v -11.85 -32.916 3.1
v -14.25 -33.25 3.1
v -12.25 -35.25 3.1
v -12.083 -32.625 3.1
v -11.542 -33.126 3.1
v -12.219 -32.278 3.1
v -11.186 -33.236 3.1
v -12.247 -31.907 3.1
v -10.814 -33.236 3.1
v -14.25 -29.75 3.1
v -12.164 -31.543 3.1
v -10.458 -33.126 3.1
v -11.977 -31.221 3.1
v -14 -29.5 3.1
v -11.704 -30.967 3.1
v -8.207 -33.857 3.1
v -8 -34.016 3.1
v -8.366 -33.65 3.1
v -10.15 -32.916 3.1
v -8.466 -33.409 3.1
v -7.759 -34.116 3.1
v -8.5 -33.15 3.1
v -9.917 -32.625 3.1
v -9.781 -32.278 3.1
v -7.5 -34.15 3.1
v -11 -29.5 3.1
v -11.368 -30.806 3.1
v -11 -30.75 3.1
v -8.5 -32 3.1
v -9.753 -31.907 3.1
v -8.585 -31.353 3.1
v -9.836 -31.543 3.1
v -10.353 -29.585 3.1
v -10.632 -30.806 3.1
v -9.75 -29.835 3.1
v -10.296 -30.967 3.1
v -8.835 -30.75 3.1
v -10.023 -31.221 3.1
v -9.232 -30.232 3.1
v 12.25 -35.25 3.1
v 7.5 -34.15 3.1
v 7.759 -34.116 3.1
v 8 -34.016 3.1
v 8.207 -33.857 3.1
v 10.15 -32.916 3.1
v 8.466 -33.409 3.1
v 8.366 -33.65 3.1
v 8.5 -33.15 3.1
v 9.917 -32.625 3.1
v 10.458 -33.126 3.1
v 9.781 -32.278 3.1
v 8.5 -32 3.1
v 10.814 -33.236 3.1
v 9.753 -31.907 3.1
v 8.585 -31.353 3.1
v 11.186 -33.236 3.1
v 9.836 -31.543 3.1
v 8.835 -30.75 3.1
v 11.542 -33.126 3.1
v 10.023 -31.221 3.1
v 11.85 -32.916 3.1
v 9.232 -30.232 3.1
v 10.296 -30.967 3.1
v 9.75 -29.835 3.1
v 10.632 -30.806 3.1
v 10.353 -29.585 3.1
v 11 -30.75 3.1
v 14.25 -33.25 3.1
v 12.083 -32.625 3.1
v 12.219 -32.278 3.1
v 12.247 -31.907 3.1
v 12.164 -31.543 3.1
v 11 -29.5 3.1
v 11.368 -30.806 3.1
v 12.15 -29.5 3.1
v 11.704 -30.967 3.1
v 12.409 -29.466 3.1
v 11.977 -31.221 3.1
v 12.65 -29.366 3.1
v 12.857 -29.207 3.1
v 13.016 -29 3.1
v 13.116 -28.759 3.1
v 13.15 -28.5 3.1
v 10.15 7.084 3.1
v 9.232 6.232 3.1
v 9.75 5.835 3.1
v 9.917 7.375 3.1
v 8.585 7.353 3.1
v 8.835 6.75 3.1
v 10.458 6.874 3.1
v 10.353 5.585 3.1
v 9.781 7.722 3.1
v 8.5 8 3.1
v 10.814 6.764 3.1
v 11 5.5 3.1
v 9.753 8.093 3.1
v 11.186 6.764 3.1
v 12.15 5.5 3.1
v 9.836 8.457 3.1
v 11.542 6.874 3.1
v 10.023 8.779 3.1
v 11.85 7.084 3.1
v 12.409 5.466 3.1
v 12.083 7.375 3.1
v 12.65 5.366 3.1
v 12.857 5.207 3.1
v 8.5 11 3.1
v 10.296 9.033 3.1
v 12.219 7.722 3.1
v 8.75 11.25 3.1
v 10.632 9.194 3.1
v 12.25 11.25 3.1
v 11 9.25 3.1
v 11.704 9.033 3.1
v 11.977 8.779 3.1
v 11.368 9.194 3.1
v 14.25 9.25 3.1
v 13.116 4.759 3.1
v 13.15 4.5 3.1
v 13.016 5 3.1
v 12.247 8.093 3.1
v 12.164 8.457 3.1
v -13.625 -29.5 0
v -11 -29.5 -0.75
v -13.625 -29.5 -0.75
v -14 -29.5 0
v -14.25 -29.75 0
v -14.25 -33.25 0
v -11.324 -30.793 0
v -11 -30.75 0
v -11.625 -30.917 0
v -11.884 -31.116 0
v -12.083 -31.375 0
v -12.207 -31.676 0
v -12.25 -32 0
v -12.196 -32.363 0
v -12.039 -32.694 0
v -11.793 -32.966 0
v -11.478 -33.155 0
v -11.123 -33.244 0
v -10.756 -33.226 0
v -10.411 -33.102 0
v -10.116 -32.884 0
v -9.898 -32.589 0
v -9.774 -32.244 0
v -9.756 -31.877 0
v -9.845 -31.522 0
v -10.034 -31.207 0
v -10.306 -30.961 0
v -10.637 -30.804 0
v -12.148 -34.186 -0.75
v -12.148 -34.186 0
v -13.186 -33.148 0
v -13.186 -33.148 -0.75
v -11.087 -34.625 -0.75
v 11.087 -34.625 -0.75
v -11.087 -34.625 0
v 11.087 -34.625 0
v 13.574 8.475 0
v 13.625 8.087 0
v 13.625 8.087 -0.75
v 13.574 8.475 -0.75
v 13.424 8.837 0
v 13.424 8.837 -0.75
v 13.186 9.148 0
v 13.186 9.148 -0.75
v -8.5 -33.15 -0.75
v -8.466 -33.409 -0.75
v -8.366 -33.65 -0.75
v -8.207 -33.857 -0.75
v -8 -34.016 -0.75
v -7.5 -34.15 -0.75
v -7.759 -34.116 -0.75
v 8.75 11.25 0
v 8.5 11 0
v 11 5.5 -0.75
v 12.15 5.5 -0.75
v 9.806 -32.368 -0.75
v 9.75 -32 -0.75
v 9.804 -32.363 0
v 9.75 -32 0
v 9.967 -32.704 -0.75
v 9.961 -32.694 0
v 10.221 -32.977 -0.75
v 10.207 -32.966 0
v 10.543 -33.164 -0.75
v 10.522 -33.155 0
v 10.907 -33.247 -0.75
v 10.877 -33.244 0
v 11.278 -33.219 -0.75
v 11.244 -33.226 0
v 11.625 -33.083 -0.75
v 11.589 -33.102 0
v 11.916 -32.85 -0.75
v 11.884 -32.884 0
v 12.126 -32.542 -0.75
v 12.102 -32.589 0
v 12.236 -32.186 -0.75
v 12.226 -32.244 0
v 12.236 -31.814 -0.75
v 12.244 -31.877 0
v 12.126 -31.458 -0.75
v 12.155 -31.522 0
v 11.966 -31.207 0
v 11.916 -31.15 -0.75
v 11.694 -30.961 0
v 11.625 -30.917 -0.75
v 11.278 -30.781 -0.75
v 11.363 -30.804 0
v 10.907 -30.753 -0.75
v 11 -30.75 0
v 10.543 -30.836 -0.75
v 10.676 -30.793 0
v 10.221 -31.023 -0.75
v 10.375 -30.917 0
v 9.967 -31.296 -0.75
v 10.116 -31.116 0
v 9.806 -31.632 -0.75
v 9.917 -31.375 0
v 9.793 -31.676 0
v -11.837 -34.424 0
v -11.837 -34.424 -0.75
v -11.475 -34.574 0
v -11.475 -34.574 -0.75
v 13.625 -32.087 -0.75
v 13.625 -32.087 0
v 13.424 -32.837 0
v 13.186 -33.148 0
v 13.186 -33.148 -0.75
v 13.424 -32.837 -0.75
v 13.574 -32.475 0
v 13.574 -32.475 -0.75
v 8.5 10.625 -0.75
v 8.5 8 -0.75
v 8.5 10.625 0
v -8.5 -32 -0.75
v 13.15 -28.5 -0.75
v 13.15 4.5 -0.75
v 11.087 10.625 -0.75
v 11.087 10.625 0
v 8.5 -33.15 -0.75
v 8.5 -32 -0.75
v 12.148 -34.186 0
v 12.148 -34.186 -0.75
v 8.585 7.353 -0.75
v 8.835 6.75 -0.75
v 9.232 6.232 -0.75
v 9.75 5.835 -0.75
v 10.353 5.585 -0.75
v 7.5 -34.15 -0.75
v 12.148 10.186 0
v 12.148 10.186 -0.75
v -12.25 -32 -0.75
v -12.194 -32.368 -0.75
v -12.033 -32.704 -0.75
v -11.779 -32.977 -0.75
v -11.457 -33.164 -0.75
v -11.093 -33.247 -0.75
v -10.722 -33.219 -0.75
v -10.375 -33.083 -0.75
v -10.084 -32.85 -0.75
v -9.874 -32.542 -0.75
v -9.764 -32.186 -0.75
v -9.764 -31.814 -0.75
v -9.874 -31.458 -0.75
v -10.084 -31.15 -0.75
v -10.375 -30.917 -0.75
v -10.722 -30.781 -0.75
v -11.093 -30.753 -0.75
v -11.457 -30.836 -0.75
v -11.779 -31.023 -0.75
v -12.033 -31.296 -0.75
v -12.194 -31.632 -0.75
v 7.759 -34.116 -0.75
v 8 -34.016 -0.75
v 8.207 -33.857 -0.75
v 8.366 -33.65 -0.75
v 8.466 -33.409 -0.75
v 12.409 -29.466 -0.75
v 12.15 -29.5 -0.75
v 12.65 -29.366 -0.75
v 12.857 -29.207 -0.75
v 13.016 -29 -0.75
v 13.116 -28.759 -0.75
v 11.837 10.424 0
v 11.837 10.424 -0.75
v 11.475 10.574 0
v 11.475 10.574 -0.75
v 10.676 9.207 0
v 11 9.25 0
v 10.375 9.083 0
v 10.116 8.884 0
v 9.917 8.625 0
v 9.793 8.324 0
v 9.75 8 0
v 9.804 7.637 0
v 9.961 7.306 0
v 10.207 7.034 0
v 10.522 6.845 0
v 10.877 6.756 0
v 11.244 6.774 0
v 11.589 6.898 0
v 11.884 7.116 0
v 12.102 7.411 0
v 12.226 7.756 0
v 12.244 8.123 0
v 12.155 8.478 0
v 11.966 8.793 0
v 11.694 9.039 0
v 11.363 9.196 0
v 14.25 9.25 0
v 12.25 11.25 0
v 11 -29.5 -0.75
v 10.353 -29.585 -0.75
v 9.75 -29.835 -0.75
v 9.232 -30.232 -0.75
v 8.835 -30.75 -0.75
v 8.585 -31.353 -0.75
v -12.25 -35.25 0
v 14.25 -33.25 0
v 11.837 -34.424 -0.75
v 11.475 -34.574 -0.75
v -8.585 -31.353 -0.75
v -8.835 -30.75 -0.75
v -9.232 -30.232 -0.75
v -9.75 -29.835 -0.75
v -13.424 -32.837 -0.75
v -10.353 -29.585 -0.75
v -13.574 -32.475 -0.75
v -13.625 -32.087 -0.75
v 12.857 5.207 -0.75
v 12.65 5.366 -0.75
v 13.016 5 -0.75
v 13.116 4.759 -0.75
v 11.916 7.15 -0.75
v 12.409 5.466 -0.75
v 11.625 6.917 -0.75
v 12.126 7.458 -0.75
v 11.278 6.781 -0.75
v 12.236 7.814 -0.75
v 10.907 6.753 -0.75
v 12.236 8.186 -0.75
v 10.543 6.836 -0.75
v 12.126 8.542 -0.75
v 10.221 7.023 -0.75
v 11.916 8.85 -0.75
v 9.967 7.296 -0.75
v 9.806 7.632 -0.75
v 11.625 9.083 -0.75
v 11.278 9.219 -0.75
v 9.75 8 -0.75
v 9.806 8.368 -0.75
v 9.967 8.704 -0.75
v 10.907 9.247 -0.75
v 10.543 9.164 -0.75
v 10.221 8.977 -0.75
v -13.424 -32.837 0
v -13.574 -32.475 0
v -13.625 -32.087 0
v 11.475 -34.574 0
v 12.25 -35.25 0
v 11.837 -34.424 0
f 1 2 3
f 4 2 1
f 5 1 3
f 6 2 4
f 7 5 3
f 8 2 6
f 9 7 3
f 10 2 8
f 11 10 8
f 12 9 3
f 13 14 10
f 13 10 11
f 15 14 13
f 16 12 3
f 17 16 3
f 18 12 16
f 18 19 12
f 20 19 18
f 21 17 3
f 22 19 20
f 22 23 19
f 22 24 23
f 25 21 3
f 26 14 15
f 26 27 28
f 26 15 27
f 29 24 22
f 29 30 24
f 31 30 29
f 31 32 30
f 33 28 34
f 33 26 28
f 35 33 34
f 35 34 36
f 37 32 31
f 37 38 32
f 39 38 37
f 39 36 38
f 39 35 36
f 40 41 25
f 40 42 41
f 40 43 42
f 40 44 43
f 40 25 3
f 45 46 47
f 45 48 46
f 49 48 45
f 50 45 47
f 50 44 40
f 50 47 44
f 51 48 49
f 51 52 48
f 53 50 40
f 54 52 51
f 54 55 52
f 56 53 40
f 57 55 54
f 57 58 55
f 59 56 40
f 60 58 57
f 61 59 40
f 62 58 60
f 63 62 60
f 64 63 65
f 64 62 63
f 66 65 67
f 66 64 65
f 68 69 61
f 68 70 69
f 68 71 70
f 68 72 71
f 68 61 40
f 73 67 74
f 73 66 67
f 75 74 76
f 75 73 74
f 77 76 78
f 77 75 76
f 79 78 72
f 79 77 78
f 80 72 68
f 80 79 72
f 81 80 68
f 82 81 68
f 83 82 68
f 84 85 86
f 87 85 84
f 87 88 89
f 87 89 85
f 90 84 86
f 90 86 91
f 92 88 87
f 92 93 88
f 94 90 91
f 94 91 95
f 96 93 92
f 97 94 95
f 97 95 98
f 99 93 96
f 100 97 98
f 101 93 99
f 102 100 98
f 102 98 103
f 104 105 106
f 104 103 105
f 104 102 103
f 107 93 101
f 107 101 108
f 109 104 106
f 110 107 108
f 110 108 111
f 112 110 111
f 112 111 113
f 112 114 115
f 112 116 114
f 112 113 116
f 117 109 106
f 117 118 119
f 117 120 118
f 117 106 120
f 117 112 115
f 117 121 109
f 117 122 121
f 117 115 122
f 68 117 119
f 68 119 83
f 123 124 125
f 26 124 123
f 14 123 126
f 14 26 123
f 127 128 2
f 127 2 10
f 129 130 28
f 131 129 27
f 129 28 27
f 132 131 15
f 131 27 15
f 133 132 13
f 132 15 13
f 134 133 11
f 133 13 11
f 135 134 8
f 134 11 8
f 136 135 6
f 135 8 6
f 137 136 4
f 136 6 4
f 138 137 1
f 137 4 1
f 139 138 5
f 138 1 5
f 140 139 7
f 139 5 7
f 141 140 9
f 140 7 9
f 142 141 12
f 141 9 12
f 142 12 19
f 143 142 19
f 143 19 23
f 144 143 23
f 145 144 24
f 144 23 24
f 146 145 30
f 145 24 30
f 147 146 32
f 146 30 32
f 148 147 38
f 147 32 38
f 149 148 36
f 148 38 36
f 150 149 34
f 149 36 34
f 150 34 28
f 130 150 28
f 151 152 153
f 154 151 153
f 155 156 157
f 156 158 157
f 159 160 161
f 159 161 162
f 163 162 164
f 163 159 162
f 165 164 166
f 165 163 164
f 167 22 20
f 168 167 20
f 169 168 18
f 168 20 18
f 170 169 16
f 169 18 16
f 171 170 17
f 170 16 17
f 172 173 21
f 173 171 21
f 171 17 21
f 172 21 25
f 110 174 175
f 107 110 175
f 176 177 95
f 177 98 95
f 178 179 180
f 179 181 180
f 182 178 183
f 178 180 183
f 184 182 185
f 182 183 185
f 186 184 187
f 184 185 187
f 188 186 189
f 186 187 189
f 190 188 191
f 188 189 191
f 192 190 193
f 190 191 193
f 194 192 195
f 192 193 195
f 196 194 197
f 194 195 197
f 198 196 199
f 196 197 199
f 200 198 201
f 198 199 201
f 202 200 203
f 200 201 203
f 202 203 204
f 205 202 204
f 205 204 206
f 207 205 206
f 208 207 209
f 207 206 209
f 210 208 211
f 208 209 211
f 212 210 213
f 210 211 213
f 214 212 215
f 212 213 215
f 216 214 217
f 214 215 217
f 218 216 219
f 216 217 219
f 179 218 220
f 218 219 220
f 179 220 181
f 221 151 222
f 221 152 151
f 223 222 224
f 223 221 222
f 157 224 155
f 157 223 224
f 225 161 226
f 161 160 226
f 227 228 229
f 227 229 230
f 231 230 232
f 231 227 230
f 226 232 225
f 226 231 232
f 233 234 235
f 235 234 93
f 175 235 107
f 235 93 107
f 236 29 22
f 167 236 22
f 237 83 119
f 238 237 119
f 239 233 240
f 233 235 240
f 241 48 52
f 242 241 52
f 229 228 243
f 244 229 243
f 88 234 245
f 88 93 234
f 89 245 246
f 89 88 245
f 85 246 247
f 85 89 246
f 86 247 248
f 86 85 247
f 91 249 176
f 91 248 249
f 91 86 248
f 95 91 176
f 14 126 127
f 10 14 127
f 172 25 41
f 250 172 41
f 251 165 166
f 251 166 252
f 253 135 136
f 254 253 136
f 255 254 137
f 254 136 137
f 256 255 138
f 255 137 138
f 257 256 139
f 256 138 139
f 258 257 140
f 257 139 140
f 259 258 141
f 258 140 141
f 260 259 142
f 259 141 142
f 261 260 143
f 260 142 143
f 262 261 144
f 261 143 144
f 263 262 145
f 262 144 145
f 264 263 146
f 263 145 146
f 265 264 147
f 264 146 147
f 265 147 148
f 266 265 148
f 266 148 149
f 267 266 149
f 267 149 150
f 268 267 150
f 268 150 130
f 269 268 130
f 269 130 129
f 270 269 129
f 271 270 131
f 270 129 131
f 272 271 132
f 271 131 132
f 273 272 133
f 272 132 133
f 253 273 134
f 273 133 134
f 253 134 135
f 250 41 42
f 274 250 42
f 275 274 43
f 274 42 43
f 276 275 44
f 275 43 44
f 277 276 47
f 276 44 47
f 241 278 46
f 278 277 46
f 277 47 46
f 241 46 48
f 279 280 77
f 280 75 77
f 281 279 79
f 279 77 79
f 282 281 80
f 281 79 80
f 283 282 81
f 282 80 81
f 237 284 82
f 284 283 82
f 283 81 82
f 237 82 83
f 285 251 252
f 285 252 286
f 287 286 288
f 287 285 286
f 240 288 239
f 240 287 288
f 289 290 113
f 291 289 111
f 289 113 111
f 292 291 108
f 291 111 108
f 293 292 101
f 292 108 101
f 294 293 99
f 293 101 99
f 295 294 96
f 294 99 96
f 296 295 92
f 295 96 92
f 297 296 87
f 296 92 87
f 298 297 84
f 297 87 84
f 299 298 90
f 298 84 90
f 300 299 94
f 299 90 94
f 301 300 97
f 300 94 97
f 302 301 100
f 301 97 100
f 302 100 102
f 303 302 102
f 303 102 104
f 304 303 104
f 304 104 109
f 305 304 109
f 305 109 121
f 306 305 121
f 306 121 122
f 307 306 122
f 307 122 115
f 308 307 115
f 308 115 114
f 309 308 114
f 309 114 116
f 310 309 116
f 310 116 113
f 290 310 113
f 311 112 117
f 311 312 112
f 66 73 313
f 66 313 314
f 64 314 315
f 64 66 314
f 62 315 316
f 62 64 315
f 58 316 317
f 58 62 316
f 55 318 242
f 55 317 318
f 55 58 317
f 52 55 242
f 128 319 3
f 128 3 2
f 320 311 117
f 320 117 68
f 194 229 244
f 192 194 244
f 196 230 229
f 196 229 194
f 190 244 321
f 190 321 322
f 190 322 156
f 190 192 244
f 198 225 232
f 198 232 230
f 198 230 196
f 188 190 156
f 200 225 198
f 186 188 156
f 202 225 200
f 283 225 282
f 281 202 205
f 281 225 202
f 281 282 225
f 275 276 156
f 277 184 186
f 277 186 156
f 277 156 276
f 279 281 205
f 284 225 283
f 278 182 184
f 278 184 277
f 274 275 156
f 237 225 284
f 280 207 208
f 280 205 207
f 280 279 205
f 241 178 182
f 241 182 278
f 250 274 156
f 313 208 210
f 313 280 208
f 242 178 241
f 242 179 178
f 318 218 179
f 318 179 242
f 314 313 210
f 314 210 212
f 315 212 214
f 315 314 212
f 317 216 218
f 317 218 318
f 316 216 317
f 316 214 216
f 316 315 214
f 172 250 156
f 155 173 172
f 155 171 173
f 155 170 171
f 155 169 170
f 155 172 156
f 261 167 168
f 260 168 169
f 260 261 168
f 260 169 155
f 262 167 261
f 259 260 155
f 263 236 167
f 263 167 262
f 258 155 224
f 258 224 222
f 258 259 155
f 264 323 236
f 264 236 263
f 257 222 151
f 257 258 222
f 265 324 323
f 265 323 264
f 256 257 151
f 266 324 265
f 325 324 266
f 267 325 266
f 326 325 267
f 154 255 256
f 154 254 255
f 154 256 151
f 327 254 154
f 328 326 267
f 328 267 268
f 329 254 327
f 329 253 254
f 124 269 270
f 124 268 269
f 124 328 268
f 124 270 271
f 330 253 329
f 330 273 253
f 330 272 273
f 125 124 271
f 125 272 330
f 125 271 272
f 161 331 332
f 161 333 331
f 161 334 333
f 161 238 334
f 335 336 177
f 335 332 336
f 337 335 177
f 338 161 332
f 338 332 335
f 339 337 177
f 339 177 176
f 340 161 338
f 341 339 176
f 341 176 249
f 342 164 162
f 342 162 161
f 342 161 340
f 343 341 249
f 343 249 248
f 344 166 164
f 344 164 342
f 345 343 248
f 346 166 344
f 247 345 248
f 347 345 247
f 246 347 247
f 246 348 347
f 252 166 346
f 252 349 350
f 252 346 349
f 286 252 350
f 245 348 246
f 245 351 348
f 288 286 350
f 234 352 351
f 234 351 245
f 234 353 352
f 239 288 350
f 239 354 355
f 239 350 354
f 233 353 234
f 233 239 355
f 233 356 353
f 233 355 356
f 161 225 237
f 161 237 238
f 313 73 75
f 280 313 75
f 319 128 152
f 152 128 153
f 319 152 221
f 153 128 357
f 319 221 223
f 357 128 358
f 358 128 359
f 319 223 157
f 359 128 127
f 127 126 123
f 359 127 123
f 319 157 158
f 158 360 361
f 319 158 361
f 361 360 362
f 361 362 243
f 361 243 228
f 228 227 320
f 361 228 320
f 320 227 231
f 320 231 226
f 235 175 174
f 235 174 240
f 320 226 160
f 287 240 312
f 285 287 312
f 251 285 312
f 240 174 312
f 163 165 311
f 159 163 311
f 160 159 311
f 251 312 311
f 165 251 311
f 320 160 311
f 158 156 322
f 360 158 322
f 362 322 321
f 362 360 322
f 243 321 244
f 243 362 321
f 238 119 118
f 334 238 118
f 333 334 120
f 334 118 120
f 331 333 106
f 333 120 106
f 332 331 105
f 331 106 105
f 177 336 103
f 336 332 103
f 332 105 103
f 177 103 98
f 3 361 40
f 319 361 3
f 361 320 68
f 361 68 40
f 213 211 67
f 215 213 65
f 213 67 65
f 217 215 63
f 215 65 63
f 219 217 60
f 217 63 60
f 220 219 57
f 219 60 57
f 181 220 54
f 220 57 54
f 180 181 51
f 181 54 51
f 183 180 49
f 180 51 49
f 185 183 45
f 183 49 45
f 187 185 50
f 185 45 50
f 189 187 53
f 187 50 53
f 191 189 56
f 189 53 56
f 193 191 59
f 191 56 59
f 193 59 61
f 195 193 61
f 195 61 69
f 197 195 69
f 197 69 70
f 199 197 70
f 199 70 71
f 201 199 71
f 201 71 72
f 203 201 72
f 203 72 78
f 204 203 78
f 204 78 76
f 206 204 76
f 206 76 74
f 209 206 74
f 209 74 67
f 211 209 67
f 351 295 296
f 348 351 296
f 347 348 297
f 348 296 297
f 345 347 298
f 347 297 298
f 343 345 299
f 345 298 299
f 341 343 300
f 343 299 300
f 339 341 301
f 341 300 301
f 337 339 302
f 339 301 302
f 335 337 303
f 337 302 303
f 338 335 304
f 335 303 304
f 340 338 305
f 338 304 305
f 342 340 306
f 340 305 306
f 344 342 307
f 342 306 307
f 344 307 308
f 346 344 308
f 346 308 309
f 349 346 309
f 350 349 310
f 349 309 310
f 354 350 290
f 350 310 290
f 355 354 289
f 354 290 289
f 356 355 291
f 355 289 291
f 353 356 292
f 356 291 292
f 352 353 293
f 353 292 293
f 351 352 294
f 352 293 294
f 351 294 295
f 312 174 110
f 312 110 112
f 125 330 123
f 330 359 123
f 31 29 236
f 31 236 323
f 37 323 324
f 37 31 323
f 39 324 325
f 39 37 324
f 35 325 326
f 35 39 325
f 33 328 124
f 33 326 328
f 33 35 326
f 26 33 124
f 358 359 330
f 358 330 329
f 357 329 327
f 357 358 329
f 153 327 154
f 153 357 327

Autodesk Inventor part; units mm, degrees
ref_plane "YZ Plane" through (0, 0, 0) normal (1, 0, 0) x (0, 1, 0)
ref_plane "XZ Plane" through (0, 0, 0) normal (0, 1, 0) x (-1, 0, 0)
ref_plane "XY Plane" through (0, 0, 0) normal (0, 0, 1) x (1, 0, 0)
sketch "スケッチ1" plane through (0, 0, 0) normal (0, 0, 1) x (1, 0, 0)
  line L0 (8.75, 11.25) -> (12.25, 11.25)
  line L1 (14.25, 9.25) -> (14.25, -33.25)
  line L2 (12.25, -35.25) -> (-12.25, -35.25)
  line L3 (-14.25, -33.25) -> (-14.25, -29.75)
  line L4 (-12.25, 11.25) -> (-14.25, 9.25)
  line L5 (12.25, 11.25) -> (14.25, 9.25)
  line L6 (14.25, -33.25) -> (12.25, -35.25)
  line L7 (-12.25, -35.25) -> (-14.25, -33.25)
  line L8 (0, 0) -> (-26.5626, 0) construction
  line L9 (0, 0) -> (0, 27.9433) construction
  line L10 (-11, 8) -> (11, 8) construction
  line L11 (11, 8) -> (11, -32) construction
  line L12 (11, -32) -> (-11, -32) construction
  line L13 (-11, -32) -> (-11, 8) construction
  line L14 (-13.15, -28.5) -> (-13.15, 4.5) construction
  line L15 (-7.5, 10.15) -> (7.5, 10.15) construction
  line L16 (13.15, 4.5) -> (13.15, -28.5)
  line L17 (7.5, -34.15) -> (-7.5, -34.15)
  line L18 (8.5, 8) -> (8.5, 11)
  line L19 (11, 5.5) -> (12.15, 5.5)
  arc A0 (8.5, 8) -> (11, 5.5) centre (11, 8) ccw
  line L20 (12.15, -29.5) -> (11, -29.5)
  line L21 (8.5, -32) -> (8.5, -33.15)
  arc A1 (11, -29.5) -> (8.5, -32) centre (11, -32) ccw
  line L22 (-8.5, 8) -> (-8.5, 9.15) construction
  line L23 (-11, 5.5) -> (-12.15, 5.5) construction
  arc A2 (-11, 5.5) -> (-8.5, 8) centre (-11, 8) ccw construction
  line L24 (-14, -29.5) -> (-11, -29.5)
  line L25 (-8.5, -32) -> (-8.5, -33.15)
  arc A3 (-8.5, -32) -> (-11, -29.5) centre (-11, -32) ccw
  arc A4 (8.5, 9.15) -> (7.5, 10.15) centre (7.5, 9.15) ccw construction
  arc A5 (13.15, 4.5) -> (12.15, 5.5) centre (12.15, 4.5) ccw
  arc A6 (12.15, -29.5) -> (13.15, -28.5) centre (12.15, -28.5) ccw
  arc A7 (7.5, -34.15) -> (8.5, -33.15) centre (7.5, -33.15) ccw
  arc A8 (-8.5, -33.15) -> (-7.5, -34.15) centre (-7.5, -33.15) ccw
  arc A9 (-13.15, -28.5) -> (-12.15, -29.5) centre (-12.15, -28.5) ccw construction
  arc A10 (-12.15, 5.5) -> (-13.15, 4.5) centre (-12.15, 4.5) ccw construction
  arc A11 (-7.5, 10.15) -> (-8.5, 9.15) centre (-7.5, 9.15) ccw construction
  line L26 (8.75, 11.25) -> (8.5, 11)
  line L27 (-14, -29.5) -> (-14.25, -29.75)
  point P0 (-14.25, 11.25)
  point P1 (14.25, -35.25)
  point P2 (14.25, 11.25)
  point P3 (-14.25, -35.25)
  point P4 (8.5, 10.15)
  point P5 (13.15, 5.5)
  point P6 (13.15, -29.5)
  point P7 (8.5, -34.15)
  point P8 (-8.5, 10.15)
  point P9 (-13.15, 5.5)
  point P10 (-13.15, -29.5)
  point P11 (-8.5, -34.15)
  point P12 (8.5, 11.25)
  point P13 (-14.25, -29.5)
  dimension "d0" = 2
  dimension "d1" = 2
  dimension "d2" = 2
  dimension "d3" = 2
  dimension "d4" = 2
  dimension "d5" = 2
  dimension "d6" = 2
  dimension "d7" = 2
  dimension "d8" = 28.5
  dimension "d9" = 11.25
  dimension "d10" = 46.5
  dimension "d11" = 8
  dimension "d12" = 22
  dimension "d13" = 40
  dimension "d14" = 1.1
  dimension "d15" = 2.5
  dimension "d16" = 2.5
  dimension "d17" = 1.1
  dimension "d18" = 1.1
  dimension "d19" = 1
  dimension "d35" = 0.25
  dimension "d36" = 0.25
  dimension "d37" = 0.25
  dimension "d38" = 0.25
extrude "押し出し1" add sketch "スケッチ1" along normal blind 3.1
hole "穴1" at (-11, 8, 0) at (11, 8, 0) at (11, -32, 0) at (-11, -32, 0) direction (0, 0, 1) diameter 2.5 end through all
sketch "スケッチ3" plane through (0, 0, 0) normal (0, 0, -1) x (-1, 0, 0)
  line L0 (-8.75, 11.25) -> (-12.25, 11.25) construction
  line L1 (14.25, -33.25) -> (14.25, -29.75) construction
  line L2 (12.25, -35.25) -> (14.25, -33.25) construction
  line L3 (-12.25, -35.25) -> (12.25, -35.25) construction
  line L4 (-14.25, -33.25) -> (-12.25, -35.25) construction
  line L5 (-14.25, 9.25) -> (-14.25, -33.25) construction
  line L6 (-12.25, 11.25) -> (-14.25, 9.25) construction
  line L7 (-8.5, 10.625) -> (-11.087, 10.625)
  line L8 (-11.9911, 10.625) -> (-13.625, 8.9911) construction
  line L9 (-13.625, 8.087) -> (-13.625, -32.087)
  line L10 (-13.625, -32.9911) -> (-11.9911, -34.625) construction
  line L11 (-11.087, -34.625) -> (11.087, -34.625)
  line L12 (11.9911, -34.625) -> (13.625, -32.9911) construction
  line L13 (13.625, -32.087) -> (13.625, -29.5)
  line L14 (-13.1857, -33.1476) -> (-12.1476, -34.1857)
  line L15 (12.1476, -34.1857) -> (13.1857, -33.1476)
  line L16 (-13.1857, 9.1476) -> (-12.1476, 10.1857)
  arc A0 (-13.1857, 9.1476) -> (-13.625, 8.087) centre (-12.125, 8.087) ccw
  arc A1 (-11.087, 10.625) -> (-12.1476, 10.1857) centre (-11.087, 9.125) ccw
  arc A2 (13.1857, -33.1476) -> (13.625, -32.087) centre (12.125, -32.087) ccw
  arc A3 (11.087, -34.625) -> (12.1476, -34.1857) centre (11.087, -33.125) ccw
  arc A4 (-12.1476, -34.1857) -> (-11.087, -34.625) centre (-11.087, -33.125) ccw
  arc A5 (-13.625, -32.087) -> (-13.1857, -33.1476) centre (-12.125, -32.087) ccw
  arc A6 (-12.15, 5.5) -> (-13.15, 4.5) centre (-12.15, 4.5) ccw projected
  line L17 (-12.15, 5.5) -> (-11, 5.5) projected
  arc A7 (-11, 5.5) -> (-8.5, 8) centre (-11, 8) ccw projected
  line L18 (-8.5, 8) -> (-8.5, 11) construction
  line L19 (14, -29.5) -> (11, -29.5) construction
  arc A8 (11, -29.5) -> (8.5, -32) centre (11, -32) ccw projected
  line L20 (8.5, -32) -> (8.5, -33.15) projected
  arc A9 (7.5, -34.15) -> (8.5, -33.15) centre (7.5, -33.15) ccw projected
  circle A10 centre (11, -32) radius 1.25 projected
  line L21 (7.5, -34.15) -> (-7.5, -34.15) projected
  arc A11 (-8.5, -33.15) -> (-7.5, -34.15) centre (-7.5, -33.15) ccw projected
  line L22 (-8.5, -33.15) -> (-8.5, -32) projected
  arc A12 (-8.5, -32) -> (-11, -29.5) centre (-11, -32) ccw projected
  line L23 (-11, -29.5) -> (-12.15, -29.5) projected
  arc A13 (-13.15, -28.5) -> (-12.15, -29.5) centre (-12.15, -28.5) ccw projected
  circle A14 centre (-11, -32) radius 1.25 projected
  line L24 (-13.15, -28.5) -> (-13.15, 4.5) projected
  circle A15 centre (-11, 8) radius 1.25 projected
  line L25 (11, -29.5) -> (13.625, -29.5)
  line L26 (-8.5, 8) -> (-8.5, 10.625)
  point P0 (0, 0)
  dimension "d30" = 0.625
  dimension "d31" = 1.5
  dimension "d32" = 0.2
  dimension "d39" = 0.625
  dimension "d40" = 0.625
  dimension "d41" = 0.2
extrude "押し出し2" add sketch "スケッチ3" along normal blind 0.75
equation "\"d1\" = d0"
equation "\"d2\" = d0"
equation "\"d3\" = d2"
equation "\"d4\" = d0"
equation "\"d5\" = d4"
equation "\"d6\" = d0"
equation "\"d7\" = d6"
equation "\"d36\" = d35"
equation "\"d37\" = d35"
equation "\"d38\" = d37"
properties part number "COXA_YAW_ROLL_ADPT_SPACER"
